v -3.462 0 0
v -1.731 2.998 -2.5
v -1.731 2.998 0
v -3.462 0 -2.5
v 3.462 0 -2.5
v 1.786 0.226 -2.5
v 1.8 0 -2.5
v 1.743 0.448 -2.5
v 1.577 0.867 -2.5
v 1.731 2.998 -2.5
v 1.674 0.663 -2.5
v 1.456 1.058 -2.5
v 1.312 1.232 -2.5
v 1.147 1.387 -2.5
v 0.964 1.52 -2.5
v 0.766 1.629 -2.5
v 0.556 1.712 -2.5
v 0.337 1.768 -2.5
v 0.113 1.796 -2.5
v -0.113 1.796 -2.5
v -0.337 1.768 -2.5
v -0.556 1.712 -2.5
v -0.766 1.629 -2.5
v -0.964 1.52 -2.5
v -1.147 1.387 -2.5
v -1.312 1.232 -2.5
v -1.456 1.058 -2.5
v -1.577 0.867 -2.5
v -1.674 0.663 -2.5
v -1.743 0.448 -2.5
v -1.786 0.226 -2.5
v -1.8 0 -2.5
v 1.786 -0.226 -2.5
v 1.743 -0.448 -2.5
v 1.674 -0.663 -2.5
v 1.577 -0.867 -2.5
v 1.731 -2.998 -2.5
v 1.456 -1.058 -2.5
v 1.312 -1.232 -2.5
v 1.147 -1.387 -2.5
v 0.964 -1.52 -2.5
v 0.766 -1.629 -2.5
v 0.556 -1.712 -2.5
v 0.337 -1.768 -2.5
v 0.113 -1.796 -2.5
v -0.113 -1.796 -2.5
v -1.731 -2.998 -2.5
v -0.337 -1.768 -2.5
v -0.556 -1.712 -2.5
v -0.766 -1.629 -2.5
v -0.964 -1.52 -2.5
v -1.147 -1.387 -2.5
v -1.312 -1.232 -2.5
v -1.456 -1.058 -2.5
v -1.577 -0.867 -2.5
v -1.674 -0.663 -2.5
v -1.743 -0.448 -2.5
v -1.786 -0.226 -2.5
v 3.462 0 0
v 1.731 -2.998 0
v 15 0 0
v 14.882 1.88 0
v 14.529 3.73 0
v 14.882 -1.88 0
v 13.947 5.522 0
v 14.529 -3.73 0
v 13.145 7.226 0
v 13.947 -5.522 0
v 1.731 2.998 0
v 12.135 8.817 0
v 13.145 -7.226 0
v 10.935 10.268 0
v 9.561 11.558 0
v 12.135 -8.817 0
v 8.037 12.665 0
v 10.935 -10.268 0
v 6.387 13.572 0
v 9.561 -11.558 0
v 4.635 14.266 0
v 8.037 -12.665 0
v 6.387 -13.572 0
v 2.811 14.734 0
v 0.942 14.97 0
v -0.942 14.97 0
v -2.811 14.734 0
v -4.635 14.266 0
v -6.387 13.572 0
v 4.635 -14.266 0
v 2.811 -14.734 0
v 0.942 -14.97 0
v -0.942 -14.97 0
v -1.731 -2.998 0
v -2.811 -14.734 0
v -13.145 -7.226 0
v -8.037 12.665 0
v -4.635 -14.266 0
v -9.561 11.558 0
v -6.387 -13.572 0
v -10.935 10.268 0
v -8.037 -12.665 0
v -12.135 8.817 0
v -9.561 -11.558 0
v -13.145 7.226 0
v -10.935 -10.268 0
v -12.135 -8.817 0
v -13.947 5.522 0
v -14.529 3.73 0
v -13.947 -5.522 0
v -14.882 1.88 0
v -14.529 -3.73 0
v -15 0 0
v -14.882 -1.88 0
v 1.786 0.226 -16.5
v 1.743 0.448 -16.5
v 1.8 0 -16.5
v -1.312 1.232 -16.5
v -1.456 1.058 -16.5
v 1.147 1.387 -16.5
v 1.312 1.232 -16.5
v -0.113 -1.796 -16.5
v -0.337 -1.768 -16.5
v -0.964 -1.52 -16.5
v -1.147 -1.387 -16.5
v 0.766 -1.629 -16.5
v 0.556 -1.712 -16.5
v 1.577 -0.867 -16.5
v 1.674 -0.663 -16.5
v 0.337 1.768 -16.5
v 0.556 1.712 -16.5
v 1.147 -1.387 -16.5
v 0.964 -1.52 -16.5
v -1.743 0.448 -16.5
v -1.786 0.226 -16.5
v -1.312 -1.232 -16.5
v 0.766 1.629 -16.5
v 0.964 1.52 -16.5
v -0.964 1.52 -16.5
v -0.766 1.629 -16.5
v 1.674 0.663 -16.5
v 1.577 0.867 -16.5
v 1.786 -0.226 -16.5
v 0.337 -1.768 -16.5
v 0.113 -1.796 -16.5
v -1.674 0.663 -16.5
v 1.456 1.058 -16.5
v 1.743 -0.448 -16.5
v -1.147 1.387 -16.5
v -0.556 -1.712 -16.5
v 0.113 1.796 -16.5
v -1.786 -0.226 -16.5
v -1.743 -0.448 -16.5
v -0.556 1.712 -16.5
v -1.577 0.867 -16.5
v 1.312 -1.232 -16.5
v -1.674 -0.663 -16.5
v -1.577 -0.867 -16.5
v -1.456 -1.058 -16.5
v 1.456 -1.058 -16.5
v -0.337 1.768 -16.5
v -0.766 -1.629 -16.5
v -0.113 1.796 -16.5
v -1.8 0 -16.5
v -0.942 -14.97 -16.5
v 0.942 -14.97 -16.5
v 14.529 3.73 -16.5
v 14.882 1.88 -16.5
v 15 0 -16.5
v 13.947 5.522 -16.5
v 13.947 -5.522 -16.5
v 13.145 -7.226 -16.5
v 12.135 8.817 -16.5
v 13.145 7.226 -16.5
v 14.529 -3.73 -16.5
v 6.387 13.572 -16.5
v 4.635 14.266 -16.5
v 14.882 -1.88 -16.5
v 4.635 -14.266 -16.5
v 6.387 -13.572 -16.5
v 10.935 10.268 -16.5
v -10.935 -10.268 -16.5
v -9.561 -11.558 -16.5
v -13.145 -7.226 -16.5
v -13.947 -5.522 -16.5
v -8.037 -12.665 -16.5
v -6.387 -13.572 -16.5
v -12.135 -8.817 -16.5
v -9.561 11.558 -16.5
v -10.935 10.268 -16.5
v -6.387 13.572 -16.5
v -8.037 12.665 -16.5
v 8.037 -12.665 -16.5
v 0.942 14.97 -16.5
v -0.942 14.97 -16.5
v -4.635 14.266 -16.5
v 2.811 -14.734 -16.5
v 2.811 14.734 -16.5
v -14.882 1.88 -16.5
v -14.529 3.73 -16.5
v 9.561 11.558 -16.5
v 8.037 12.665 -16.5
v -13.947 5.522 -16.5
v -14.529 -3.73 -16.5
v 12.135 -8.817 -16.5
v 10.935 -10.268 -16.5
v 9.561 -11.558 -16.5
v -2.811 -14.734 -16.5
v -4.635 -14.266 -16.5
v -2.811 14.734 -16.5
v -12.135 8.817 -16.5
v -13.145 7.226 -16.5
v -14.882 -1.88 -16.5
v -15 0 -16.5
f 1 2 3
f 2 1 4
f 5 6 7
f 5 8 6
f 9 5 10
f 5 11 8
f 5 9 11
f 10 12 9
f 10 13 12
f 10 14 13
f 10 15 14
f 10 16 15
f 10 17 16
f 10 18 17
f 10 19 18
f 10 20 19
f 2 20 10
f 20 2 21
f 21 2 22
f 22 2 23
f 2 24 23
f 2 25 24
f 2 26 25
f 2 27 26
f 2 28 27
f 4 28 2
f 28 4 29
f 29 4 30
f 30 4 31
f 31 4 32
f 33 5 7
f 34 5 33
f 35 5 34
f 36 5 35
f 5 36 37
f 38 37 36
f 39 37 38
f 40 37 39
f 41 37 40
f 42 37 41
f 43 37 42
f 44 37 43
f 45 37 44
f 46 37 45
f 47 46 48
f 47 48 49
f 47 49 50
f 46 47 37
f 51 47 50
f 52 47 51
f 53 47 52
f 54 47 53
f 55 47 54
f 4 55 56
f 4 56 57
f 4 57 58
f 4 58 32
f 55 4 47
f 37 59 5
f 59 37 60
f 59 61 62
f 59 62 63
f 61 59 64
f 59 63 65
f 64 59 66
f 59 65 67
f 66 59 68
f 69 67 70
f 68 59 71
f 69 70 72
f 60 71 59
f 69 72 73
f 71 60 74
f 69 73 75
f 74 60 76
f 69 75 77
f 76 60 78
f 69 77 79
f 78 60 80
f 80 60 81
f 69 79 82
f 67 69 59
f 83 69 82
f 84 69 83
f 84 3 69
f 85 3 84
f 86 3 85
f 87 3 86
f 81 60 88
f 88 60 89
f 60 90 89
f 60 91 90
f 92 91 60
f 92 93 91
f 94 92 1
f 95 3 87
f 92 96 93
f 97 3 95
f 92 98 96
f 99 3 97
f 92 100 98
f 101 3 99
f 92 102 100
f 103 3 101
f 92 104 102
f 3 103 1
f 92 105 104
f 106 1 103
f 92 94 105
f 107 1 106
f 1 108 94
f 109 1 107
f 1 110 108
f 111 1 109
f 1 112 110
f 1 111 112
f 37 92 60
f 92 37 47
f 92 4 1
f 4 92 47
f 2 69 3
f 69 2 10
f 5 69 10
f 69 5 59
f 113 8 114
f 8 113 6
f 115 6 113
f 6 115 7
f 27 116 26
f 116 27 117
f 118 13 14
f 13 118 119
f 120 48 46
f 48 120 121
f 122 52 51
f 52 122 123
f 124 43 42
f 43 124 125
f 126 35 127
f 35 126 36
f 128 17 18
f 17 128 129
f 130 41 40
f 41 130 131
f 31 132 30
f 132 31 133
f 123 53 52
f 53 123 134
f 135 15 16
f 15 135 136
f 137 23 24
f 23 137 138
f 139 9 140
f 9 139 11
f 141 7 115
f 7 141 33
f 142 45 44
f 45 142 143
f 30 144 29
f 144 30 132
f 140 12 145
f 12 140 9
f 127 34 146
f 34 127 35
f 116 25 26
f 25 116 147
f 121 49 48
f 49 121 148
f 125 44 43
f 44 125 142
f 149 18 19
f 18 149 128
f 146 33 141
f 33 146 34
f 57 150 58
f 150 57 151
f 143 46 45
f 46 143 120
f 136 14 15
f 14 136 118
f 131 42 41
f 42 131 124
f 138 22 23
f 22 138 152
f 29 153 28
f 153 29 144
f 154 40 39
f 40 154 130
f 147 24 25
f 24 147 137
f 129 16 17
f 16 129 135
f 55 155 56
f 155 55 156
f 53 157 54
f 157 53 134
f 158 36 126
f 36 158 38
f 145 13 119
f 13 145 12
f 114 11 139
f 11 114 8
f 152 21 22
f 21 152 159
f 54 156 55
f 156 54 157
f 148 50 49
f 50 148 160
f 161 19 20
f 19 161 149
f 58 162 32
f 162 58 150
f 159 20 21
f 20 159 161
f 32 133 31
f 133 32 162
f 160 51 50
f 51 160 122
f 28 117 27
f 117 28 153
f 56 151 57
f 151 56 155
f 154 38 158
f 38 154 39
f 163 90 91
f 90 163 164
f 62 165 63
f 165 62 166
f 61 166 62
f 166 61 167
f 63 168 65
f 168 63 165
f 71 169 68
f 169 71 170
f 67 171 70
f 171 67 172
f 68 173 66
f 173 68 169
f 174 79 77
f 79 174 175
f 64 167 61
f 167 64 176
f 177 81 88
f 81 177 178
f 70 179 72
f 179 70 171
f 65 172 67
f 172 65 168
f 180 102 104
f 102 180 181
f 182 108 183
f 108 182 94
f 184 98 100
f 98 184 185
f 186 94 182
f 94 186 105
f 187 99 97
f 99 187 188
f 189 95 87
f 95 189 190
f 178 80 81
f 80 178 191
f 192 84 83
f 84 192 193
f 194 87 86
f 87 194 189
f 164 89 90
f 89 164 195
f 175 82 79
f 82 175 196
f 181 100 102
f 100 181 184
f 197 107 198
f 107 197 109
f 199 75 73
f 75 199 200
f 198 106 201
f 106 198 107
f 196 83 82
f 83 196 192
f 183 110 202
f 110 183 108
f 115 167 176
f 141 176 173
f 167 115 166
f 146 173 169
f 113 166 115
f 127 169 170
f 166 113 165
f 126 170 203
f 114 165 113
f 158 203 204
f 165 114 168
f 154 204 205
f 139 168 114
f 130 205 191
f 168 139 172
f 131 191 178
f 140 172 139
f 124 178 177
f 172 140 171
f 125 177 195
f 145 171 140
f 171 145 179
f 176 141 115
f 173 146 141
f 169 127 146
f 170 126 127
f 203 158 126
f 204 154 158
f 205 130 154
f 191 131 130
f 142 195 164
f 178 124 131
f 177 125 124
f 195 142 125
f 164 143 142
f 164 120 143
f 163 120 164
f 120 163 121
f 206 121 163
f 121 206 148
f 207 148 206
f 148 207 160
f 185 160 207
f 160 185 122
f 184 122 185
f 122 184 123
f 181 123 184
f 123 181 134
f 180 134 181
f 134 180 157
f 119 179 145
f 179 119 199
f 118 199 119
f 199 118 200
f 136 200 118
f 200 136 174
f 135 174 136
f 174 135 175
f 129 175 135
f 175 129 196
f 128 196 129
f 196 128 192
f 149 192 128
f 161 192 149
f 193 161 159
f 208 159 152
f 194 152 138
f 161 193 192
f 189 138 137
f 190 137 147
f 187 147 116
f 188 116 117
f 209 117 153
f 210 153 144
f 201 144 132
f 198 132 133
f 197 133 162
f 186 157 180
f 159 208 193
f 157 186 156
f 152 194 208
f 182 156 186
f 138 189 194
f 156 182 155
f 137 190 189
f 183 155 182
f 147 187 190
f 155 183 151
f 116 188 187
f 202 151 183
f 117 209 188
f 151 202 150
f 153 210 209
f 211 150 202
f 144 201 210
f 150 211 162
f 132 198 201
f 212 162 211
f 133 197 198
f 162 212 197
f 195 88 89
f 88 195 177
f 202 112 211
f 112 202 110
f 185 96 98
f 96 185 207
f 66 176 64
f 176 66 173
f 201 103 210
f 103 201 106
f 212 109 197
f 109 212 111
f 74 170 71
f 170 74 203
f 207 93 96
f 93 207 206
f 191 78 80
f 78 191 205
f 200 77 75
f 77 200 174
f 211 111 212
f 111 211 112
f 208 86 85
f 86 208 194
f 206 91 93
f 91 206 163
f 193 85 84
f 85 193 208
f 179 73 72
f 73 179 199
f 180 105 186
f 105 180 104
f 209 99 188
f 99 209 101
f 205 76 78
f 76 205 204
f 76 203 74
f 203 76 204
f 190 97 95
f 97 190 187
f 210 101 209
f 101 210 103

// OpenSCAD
$fn = 50;


difference() {
	union() {
		translate(v = [0, 0, -16.5000000000]) {
			cylinder(h = 16.5000000000, r = 15.0000000000);
		}
	}
	union() {
		translate(v = [0, 0, 0]) {
			rotate(a = [0, 0, 0]) {
				difference() {
					union() {
						translate(v = [0, 0, -2.5000000000]) {
							linear_extrude(height = 2.5000000000) {
								polygon(points = [[3.4620000000, 0.0000000000], [1.7310000000, 2.9981799479], [-1.7310000000, 2.9981799479], [-3.4620000000, 0.0000000000], [-1.7310000000, -2.9981799479], [1.7310000000, -2.9981799479]]);
							}
						}
					}
					union();
				}
			}
		}
		#translate(v = [0, 0, -100.0000000000]) {
			cylinder(h = 200, r = 1.8000000000);
		}
	}
}
